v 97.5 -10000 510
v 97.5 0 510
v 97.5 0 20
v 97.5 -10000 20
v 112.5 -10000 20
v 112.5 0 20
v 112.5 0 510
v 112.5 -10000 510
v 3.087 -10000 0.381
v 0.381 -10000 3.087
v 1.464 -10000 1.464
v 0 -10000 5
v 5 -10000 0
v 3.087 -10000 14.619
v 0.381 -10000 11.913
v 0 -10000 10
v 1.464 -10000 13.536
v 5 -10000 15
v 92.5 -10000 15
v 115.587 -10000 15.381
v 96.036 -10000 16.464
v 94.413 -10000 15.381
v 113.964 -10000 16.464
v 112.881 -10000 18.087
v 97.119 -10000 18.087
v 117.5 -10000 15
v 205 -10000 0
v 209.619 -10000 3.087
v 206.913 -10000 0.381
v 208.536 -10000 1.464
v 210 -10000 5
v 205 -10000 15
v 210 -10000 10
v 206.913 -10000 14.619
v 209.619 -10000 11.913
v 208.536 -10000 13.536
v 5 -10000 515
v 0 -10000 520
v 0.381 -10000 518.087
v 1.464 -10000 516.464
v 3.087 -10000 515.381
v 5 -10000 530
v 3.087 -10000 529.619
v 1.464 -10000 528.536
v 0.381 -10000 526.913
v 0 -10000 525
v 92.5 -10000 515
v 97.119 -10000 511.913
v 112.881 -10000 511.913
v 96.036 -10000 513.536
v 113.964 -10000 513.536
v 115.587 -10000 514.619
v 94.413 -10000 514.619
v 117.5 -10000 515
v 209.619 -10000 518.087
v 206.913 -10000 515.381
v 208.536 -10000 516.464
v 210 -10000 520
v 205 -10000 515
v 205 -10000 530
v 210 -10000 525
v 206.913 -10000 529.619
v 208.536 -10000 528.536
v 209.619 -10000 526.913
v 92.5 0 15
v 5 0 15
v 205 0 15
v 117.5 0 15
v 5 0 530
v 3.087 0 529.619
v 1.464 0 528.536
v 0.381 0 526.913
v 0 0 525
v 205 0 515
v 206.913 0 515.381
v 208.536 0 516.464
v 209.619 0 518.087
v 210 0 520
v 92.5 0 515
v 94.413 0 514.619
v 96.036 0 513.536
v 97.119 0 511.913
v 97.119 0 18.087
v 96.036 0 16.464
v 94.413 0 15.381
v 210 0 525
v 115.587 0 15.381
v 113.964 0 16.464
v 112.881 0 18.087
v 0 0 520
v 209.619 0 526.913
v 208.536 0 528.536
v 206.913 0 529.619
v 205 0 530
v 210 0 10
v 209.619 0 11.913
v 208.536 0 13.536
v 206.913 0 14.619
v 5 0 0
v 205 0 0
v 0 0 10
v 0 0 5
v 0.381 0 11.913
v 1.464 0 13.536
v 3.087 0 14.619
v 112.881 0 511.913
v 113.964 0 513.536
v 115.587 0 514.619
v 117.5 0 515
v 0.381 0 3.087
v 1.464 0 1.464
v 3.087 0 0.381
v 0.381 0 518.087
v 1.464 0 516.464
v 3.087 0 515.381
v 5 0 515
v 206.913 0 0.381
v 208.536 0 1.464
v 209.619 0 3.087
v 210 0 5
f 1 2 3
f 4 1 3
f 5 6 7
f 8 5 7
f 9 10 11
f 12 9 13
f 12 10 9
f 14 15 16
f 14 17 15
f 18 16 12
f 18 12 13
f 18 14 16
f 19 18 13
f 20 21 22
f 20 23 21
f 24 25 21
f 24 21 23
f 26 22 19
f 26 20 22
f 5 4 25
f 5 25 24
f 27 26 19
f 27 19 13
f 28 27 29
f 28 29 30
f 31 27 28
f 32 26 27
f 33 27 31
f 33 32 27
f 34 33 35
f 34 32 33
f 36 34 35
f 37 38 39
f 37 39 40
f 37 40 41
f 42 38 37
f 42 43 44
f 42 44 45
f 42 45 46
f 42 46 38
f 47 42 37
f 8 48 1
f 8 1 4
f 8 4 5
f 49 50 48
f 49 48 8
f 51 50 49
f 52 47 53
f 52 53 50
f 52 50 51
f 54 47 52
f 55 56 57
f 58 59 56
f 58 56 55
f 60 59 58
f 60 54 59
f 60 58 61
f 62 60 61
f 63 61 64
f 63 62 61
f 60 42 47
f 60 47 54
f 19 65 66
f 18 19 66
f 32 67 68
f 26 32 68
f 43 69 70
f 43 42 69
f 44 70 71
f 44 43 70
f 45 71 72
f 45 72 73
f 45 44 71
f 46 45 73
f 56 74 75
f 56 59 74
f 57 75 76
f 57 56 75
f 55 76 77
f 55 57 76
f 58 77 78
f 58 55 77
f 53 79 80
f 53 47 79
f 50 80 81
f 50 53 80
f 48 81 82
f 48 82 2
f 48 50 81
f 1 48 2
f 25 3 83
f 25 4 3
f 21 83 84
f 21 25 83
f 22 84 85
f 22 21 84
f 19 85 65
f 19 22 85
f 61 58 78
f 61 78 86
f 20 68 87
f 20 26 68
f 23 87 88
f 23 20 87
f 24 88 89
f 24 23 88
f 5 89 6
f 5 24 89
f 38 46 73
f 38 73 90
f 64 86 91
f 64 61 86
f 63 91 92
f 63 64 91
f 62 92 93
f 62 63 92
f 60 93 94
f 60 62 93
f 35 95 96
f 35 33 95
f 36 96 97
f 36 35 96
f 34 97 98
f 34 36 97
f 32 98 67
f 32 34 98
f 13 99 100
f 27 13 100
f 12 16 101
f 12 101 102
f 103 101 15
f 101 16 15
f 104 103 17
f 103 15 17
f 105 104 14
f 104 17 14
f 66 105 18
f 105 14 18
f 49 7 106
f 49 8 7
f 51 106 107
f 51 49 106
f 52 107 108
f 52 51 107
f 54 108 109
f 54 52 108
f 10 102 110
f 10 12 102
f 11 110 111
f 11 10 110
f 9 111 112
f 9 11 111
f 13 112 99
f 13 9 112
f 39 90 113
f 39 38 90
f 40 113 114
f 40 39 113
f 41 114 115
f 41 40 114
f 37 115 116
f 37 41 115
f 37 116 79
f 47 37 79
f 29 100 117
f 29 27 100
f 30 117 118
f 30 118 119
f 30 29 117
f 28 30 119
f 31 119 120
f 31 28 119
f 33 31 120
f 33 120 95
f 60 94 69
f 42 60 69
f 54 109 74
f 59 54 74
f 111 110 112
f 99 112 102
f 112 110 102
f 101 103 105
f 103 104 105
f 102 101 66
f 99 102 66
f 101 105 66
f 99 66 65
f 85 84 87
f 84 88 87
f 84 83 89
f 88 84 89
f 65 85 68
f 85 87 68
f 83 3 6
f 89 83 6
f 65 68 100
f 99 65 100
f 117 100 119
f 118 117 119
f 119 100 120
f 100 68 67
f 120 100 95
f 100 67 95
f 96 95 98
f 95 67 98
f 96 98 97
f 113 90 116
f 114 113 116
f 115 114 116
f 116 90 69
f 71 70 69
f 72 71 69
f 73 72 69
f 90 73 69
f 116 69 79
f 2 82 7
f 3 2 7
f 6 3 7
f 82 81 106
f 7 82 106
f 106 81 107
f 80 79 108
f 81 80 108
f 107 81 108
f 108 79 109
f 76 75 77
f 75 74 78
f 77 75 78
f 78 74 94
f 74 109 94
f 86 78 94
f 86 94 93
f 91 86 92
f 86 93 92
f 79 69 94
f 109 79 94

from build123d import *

# Parameters (mm, degrees)
F1_DEPTH = 10000
F2_R     = 5


with BuildPart() as f1:
    # F0 (on Front) → F1 (new body)
    with BuildSketch(Plane.XZ):
        Polygon((0, 15), (0, 0), (210, 0), (210, 15), (112.5, 15), (112.5, 515), (210, 515), (210, 530), (0, 530), (0, 515), (97.5, 515), (97.5, 15), align=None)
    extrude(amount=F1_DEPTH)

    # F2
    f2_edges = [f1.edges().sort_by_distance(p)[0] for p in [
        (0, -5000, 530),
        (0, -5000, 515),
        (210, -5000, 530),
        (0, -5000, 15),
        (0, -5000, 0),
        (210, -5000, 15),
        (210, -5000, 0),
        (210, -5000, 515),
        (112.5, -5000, 15),
        (97.5, -5000, 15),
        (97.5, -5000, 515),
        (112.5, -5000, 515),
    ]]
    fillet(f2_edges, radius=F2_R)


solid = f1.part
